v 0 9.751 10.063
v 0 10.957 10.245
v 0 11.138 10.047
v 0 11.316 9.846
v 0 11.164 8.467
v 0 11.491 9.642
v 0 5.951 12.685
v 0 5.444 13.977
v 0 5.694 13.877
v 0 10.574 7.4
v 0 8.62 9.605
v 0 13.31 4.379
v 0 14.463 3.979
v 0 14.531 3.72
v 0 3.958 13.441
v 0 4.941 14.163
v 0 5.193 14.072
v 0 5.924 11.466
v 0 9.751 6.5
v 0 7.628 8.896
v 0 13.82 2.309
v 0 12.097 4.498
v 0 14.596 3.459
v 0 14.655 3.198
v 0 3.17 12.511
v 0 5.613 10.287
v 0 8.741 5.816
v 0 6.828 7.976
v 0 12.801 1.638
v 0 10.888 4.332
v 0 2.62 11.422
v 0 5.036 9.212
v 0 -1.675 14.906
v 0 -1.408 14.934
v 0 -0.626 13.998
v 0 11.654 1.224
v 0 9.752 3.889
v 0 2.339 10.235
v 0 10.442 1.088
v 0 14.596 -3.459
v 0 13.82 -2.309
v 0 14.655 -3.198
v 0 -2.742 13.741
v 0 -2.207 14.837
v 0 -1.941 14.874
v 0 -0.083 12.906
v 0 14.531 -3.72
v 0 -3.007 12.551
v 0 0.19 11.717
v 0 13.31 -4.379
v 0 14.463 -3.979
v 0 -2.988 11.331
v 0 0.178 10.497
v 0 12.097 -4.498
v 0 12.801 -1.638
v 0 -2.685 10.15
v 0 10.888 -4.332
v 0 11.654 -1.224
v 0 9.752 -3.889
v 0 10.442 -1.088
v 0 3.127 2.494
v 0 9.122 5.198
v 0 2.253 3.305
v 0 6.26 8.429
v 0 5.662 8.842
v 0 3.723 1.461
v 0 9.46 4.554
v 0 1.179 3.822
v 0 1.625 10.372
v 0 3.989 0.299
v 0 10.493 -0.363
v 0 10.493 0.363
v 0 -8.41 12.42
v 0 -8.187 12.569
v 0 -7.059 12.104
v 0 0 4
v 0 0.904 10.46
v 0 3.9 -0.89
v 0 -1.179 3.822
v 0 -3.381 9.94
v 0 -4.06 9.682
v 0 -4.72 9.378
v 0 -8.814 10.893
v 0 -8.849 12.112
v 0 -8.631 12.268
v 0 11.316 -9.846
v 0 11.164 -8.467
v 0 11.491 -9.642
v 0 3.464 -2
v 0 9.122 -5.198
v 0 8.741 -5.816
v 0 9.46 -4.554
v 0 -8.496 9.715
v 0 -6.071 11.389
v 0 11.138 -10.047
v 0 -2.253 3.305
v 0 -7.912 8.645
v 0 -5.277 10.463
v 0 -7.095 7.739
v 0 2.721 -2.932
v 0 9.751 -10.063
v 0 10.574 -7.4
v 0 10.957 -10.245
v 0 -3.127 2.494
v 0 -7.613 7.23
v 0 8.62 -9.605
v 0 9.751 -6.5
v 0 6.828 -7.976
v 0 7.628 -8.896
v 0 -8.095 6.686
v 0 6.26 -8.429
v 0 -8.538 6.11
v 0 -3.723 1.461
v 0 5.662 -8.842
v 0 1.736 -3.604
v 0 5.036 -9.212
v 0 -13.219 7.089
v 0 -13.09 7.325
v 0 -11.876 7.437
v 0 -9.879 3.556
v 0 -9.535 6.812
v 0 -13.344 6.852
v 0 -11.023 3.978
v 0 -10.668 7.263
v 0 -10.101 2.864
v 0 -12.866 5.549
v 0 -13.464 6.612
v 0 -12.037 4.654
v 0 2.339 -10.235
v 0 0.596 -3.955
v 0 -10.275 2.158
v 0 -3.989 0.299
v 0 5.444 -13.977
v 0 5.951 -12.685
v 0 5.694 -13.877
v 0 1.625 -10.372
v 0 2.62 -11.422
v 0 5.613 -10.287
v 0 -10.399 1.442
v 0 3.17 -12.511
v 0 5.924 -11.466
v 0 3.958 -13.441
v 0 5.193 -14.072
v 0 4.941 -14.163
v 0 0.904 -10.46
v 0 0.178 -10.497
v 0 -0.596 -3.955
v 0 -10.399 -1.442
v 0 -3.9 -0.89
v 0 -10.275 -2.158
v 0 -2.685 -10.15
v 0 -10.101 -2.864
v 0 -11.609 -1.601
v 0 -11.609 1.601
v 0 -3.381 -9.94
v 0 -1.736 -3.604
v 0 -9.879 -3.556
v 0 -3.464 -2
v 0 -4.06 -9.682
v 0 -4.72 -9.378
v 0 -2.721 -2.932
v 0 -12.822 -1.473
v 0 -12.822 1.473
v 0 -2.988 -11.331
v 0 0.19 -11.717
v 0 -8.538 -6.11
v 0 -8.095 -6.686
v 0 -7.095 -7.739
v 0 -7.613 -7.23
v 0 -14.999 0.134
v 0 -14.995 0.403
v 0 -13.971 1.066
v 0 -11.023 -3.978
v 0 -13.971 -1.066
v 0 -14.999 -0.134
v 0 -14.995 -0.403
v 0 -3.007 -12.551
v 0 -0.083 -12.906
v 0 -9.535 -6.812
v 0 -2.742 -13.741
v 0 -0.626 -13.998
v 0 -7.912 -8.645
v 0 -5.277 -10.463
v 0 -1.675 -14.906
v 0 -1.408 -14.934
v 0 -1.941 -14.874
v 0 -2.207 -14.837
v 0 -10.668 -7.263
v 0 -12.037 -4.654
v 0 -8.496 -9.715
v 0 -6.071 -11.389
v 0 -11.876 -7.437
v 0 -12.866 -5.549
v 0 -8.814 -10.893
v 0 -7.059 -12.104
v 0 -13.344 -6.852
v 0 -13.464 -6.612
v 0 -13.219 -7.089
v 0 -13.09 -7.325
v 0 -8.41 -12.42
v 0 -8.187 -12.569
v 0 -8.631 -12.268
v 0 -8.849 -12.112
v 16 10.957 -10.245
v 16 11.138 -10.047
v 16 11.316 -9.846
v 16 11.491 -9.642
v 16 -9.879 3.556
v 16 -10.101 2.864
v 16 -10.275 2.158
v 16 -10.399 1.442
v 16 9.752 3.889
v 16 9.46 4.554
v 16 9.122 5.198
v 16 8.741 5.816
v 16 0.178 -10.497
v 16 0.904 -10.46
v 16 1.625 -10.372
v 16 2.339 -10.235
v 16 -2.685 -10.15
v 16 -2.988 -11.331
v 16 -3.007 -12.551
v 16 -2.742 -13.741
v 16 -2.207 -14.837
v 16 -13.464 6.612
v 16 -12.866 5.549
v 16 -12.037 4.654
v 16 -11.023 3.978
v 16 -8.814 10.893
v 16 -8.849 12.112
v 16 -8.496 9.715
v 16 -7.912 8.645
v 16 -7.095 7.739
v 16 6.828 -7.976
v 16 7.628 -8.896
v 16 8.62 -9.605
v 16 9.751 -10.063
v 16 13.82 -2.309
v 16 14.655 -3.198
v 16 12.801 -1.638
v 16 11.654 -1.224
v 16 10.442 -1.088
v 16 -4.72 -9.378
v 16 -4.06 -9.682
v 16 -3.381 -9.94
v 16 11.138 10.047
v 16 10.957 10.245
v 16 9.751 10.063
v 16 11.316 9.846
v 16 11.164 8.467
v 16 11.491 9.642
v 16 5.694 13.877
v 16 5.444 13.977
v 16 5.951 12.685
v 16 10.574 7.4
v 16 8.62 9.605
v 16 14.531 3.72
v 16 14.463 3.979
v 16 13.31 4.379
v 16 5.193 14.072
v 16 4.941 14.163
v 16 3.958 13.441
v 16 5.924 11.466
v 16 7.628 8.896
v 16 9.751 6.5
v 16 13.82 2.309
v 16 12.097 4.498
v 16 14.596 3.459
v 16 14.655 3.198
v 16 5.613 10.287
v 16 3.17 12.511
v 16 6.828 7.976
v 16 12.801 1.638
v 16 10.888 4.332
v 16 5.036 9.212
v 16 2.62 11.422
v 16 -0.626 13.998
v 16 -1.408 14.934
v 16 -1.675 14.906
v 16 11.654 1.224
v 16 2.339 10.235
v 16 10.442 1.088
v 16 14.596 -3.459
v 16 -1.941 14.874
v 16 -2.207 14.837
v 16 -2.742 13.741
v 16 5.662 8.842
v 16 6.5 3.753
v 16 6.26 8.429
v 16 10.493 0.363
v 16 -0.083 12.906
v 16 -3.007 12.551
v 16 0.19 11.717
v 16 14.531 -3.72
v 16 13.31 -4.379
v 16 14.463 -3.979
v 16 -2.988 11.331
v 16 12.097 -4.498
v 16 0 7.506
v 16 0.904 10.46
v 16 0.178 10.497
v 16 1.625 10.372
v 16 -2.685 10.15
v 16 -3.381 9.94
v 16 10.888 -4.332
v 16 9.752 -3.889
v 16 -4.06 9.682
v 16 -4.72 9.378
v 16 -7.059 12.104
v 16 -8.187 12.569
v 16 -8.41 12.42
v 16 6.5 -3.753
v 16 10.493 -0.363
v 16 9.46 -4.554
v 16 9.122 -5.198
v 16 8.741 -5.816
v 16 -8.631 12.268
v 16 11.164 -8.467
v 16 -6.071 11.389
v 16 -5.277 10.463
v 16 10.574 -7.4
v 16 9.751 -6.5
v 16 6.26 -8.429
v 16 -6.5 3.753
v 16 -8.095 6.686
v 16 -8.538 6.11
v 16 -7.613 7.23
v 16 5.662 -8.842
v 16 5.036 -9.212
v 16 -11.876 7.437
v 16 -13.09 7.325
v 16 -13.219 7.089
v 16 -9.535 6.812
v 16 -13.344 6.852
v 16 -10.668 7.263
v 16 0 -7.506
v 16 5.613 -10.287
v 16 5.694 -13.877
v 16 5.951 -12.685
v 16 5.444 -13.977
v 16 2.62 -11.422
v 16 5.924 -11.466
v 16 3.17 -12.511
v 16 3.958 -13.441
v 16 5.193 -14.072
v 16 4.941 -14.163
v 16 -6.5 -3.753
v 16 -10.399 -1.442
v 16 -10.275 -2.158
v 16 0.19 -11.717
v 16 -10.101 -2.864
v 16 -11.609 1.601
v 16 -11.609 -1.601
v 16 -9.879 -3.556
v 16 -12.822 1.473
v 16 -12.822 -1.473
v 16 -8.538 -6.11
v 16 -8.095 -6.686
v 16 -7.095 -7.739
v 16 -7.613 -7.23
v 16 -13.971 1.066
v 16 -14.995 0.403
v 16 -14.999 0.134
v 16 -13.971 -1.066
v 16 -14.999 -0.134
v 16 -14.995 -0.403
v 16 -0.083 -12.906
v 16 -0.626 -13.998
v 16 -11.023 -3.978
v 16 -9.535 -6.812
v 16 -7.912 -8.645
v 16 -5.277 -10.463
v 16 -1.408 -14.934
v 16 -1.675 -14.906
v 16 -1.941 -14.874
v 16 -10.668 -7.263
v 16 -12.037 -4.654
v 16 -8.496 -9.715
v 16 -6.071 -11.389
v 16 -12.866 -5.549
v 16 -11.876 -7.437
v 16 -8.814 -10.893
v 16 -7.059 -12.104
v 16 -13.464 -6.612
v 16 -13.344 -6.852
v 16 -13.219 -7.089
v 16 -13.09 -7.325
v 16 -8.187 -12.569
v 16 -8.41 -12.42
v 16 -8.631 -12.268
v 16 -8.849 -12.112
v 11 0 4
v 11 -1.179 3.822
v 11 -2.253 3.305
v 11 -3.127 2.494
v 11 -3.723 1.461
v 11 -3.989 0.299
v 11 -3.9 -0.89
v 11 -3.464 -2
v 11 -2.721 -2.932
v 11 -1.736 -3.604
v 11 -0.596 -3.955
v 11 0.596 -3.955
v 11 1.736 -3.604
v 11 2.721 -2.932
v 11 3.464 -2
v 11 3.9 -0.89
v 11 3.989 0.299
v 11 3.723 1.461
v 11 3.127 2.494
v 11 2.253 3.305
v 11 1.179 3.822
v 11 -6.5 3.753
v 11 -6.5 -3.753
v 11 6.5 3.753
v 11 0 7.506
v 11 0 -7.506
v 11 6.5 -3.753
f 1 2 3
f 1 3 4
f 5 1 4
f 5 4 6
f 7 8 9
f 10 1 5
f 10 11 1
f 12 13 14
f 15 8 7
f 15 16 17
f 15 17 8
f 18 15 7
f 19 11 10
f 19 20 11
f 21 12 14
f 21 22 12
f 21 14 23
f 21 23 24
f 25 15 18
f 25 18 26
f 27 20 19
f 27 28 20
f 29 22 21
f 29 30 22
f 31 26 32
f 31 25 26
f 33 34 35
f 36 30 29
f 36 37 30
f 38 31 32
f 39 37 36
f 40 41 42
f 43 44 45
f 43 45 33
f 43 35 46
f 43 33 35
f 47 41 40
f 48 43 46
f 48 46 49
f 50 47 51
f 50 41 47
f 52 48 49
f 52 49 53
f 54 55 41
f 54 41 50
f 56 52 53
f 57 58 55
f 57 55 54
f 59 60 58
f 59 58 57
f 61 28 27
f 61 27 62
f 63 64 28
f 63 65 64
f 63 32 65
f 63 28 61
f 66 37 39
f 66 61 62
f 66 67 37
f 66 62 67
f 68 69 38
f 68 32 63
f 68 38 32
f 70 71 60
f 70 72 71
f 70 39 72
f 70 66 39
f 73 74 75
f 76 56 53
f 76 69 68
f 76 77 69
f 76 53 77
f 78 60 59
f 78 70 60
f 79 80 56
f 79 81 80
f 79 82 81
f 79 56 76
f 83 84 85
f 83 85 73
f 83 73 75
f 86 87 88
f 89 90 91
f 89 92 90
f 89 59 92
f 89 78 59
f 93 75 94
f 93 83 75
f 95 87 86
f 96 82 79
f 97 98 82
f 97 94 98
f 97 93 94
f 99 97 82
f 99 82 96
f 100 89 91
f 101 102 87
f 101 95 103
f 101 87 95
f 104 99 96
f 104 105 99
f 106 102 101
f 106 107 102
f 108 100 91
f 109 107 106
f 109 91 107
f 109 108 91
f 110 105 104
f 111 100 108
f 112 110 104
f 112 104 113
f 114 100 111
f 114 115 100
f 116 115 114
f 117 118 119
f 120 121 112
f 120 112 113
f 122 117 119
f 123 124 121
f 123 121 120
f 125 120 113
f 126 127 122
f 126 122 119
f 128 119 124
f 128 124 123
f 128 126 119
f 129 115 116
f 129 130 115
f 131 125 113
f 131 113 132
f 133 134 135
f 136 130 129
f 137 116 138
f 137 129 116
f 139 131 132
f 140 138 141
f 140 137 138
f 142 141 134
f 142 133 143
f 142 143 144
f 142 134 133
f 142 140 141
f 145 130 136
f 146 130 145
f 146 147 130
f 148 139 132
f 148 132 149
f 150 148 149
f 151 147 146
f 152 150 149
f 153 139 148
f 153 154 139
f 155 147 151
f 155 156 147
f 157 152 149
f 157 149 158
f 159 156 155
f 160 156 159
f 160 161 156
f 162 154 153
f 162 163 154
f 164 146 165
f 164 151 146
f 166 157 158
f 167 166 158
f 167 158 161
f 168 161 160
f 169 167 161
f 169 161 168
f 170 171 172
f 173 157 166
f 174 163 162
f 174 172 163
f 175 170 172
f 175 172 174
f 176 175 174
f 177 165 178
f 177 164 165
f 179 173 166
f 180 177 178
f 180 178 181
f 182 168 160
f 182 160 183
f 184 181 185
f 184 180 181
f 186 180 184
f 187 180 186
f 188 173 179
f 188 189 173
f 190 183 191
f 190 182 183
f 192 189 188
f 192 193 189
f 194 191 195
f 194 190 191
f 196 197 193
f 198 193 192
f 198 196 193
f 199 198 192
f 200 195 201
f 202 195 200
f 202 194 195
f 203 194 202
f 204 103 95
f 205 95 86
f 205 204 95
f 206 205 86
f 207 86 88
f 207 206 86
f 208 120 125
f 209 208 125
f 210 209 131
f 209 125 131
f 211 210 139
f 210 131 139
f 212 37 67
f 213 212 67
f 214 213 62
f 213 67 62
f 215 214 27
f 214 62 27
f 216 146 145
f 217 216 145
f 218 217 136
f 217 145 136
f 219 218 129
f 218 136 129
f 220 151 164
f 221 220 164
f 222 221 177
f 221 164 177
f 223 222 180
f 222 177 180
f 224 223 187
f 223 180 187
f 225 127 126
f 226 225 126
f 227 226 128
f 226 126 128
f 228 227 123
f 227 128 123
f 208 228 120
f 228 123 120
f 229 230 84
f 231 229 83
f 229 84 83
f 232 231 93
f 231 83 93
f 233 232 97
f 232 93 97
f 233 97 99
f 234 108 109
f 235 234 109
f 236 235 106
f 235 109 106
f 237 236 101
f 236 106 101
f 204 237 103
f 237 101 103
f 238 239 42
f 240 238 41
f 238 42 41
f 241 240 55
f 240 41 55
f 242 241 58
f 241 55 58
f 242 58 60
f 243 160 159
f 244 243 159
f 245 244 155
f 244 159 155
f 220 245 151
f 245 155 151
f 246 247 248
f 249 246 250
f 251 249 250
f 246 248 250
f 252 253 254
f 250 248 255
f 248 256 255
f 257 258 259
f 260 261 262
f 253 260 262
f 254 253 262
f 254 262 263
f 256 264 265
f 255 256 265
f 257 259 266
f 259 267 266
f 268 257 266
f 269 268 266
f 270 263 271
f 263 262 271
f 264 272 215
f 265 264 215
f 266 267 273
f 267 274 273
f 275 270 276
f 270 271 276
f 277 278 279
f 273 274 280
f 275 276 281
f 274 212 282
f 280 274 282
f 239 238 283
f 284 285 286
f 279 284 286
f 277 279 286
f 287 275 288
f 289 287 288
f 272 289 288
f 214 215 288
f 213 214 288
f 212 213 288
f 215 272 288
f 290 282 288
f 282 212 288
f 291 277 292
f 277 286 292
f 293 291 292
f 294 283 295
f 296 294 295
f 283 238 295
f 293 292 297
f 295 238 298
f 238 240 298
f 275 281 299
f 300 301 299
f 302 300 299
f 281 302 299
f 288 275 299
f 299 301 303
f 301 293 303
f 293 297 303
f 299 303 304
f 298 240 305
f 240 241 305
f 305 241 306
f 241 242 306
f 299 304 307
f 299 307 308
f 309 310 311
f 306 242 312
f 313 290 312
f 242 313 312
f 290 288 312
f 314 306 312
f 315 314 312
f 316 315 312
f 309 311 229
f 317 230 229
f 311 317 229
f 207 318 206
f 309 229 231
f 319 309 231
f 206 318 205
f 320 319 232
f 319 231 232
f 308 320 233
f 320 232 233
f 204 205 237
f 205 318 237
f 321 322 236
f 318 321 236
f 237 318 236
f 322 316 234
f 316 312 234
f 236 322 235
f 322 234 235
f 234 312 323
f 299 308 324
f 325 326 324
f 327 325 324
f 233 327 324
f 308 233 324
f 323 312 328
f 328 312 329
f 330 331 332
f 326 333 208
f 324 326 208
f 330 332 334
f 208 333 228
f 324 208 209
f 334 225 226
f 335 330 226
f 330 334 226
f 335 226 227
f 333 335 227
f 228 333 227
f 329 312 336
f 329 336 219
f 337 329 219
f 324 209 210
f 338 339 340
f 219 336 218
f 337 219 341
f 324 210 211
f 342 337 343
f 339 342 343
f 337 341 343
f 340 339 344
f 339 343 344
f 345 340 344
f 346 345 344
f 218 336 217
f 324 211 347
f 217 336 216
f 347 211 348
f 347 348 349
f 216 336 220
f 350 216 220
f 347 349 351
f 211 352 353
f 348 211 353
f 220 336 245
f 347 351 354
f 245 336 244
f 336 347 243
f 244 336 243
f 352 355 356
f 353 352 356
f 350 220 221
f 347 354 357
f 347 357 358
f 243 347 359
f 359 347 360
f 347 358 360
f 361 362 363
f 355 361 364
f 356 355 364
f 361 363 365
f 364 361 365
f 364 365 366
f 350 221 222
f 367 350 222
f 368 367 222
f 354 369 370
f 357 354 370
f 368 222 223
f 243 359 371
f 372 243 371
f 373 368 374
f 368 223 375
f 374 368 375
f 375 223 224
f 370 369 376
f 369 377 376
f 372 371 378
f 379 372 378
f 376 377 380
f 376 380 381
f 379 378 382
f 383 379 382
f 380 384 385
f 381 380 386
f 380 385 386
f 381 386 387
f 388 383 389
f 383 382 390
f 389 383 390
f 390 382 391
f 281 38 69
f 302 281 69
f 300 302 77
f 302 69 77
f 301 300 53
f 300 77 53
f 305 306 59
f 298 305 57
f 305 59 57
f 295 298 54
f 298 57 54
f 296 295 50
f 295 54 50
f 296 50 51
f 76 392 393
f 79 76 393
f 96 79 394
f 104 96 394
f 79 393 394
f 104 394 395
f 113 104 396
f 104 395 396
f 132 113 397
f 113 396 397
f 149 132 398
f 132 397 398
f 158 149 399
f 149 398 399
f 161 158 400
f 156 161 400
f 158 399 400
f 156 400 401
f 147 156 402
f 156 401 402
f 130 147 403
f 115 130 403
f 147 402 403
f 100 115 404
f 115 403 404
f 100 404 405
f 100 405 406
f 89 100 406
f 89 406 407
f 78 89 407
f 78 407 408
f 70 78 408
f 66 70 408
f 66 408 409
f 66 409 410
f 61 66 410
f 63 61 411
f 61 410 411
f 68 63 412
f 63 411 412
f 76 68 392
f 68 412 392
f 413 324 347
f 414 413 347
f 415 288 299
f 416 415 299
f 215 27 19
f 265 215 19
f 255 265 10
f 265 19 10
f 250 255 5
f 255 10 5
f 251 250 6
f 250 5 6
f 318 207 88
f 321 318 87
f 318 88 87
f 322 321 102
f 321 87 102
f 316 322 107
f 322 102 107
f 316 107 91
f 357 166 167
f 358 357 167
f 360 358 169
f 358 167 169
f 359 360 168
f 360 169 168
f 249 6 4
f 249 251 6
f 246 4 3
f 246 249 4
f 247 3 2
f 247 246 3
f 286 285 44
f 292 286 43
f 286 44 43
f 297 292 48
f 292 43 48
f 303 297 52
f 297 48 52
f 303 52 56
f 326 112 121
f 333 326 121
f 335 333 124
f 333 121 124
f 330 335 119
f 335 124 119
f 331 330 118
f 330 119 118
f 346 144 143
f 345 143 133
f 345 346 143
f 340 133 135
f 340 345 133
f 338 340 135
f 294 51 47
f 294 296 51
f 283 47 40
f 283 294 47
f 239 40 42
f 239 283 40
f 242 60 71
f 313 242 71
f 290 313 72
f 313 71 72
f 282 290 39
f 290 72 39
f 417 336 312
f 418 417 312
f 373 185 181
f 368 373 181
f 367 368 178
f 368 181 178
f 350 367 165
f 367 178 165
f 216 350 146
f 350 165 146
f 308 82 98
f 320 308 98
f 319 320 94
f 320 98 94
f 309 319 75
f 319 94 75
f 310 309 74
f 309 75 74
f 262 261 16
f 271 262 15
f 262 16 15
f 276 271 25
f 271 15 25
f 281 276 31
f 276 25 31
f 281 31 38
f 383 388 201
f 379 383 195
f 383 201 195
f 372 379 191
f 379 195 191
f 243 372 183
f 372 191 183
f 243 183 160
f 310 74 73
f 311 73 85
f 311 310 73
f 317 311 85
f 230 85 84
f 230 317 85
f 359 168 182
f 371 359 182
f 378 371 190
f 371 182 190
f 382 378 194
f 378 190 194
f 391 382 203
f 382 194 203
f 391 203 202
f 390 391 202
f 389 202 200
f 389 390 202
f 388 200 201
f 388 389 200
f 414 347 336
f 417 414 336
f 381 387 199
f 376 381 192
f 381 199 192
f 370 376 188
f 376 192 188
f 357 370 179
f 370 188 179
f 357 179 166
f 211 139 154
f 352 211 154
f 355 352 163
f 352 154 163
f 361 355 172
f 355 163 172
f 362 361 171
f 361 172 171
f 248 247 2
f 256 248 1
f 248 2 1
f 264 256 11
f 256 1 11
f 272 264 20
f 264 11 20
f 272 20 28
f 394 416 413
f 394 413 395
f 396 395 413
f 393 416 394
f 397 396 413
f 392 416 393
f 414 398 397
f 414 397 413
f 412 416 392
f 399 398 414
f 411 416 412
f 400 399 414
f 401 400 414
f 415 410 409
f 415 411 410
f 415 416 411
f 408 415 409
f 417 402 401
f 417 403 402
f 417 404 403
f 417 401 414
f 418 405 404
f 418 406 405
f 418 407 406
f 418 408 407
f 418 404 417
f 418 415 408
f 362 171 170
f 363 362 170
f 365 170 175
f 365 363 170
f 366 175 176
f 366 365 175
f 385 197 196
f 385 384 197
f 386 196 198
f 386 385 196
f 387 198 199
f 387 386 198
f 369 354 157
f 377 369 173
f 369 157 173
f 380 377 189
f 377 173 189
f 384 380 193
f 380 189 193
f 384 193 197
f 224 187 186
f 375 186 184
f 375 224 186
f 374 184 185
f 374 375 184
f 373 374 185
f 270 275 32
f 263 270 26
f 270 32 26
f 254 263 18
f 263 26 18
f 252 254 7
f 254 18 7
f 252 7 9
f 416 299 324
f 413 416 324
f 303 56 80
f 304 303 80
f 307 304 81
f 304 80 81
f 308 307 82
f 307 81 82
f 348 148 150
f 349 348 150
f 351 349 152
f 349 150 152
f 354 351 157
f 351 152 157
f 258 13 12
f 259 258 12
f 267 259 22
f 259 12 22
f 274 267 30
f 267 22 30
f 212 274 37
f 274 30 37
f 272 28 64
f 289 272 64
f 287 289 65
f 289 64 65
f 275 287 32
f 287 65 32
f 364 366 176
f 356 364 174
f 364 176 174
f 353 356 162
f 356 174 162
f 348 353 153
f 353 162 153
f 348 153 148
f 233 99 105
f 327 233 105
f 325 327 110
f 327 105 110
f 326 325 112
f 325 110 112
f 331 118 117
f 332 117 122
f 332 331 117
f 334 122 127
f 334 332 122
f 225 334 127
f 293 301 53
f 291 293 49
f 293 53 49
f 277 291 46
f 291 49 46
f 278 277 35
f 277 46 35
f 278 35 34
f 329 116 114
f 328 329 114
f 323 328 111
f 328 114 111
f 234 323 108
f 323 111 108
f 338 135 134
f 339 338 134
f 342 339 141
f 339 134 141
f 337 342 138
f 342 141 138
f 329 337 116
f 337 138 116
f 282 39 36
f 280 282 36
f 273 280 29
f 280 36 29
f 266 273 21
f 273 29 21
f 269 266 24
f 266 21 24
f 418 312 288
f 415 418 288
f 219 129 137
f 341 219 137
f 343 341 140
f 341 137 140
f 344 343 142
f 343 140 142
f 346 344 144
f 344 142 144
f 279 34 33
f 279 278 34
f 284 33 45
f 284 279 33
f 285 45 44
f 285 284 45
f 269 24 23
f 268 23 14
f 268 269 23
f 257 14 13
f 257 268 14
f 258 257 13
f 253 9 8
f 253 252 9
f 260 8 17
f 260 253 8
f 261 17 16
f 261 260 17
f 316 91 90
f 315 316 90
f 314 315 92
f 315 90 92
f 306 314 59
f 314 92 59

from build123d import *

# Parameters (mm, degrees)
BASPROSKE_W        = 16
BASPROSKE_H        = 15
TOOTHCUT_DEPTH     = 27.570660511
TEETHCUTS_COUNT    = 13
TEETHCUTS_ANGLE    = 332.307692308
BORSKE_R           = 4
BORE_DEPTH         = 50.0000508
CUT_EXTRUDE1_DEPTH = 5


with BuildPart() as part:
    # BasProSke → Base-Revolve (revolve)
    with BuildSketch(Plane(origin=(0, 0, 0), x_dir=(1, 0, 0), z_dir=(0, 1, 0)), mode=Mode.PRIVATE) as base_revolve_sk:
        with Locations((8, 7.5)):
            Rectangle(BASPROSKE_W, BASPROSKE_H)
    revolve(base_revolve_sk.sketch.rotate(Axis((-10, 0, 0), (1, 0, 0)), 180), axis=Axis((-10, 0, 0), (1, 0, 0)))

    # TooCutSke → ToothCut (cut, through all)
    with BuildSketch(Plane(origin=(0, 0, 0), x_dir=(0, 0, -1), z_dir=(1, 0, 0))):
        with BuildLine():
            ThreePointArc((1.088245291, 10.442448141), (0, 10.499), (-1.088245291, 10.442448141))
            ThreePointArc((-1.088245291, 10.442448141), (-1.646045958, 12.816546547), (-3.224884568, 14.675243258))
            ThreePointArc((-3.224884568, 14.675243258), (0, 15.0254), (3.224884568, 14.675243258))
            ThreePointArc((3.224884568, 14.675243258), (1.646045958, 12.816546547), (1.088245291, 10.442448141))
        make_face()
    toothcut = extrude(amount=TOOTHCUT_DEPTH, mode=Mode.SUBTRACT)

    # TeethCuts: ToothCut ×13 about axis
    teethcuts_axis = Axis((-10, 0, 0), (1, 0, 0))
    for i in range(1, TEETHCUTS_COUNT):
        add(toothcut.rotate(teethcuts_axis, i * TEETHCUTS_ANGLE / (TEETHCUTS_COUNT - 1)), mode=Mode.SUBTRACT)

    # BorSke → Bore (cut, symmetric)
    with BuildSketch(Plane(origin=(0, 0, 0), x_dir=(0, 0, -1), z_dir=(1, 0, 0))):
        with Locations(Location((0, 0, 0), (0, 0, 180))):
            Circle(BORSKE_R)
    extrude(amount=BORE_DEPTH, both=True, mode=Mode.SUBTRACT)

    # Sketch1 → Cut-Extrude1 (cut)
    with BuildSketch(Plane(origin=(16, 0, 0), x_dir=(0, 0, -1), z_dir=(1, 0, 0))):
        Polygon((-3.75277675, 6.5), (-7.505553499, 0), (-3.75277675, -6.5), (3.75277675, -6.5), (7.505553499, 0), (3.75277675, 6.5), align=None)
    extrude(amount=-CUT_EXTRUDE1_DEPTH, mode=Mode.SUBTRACT)


solid = part.part
